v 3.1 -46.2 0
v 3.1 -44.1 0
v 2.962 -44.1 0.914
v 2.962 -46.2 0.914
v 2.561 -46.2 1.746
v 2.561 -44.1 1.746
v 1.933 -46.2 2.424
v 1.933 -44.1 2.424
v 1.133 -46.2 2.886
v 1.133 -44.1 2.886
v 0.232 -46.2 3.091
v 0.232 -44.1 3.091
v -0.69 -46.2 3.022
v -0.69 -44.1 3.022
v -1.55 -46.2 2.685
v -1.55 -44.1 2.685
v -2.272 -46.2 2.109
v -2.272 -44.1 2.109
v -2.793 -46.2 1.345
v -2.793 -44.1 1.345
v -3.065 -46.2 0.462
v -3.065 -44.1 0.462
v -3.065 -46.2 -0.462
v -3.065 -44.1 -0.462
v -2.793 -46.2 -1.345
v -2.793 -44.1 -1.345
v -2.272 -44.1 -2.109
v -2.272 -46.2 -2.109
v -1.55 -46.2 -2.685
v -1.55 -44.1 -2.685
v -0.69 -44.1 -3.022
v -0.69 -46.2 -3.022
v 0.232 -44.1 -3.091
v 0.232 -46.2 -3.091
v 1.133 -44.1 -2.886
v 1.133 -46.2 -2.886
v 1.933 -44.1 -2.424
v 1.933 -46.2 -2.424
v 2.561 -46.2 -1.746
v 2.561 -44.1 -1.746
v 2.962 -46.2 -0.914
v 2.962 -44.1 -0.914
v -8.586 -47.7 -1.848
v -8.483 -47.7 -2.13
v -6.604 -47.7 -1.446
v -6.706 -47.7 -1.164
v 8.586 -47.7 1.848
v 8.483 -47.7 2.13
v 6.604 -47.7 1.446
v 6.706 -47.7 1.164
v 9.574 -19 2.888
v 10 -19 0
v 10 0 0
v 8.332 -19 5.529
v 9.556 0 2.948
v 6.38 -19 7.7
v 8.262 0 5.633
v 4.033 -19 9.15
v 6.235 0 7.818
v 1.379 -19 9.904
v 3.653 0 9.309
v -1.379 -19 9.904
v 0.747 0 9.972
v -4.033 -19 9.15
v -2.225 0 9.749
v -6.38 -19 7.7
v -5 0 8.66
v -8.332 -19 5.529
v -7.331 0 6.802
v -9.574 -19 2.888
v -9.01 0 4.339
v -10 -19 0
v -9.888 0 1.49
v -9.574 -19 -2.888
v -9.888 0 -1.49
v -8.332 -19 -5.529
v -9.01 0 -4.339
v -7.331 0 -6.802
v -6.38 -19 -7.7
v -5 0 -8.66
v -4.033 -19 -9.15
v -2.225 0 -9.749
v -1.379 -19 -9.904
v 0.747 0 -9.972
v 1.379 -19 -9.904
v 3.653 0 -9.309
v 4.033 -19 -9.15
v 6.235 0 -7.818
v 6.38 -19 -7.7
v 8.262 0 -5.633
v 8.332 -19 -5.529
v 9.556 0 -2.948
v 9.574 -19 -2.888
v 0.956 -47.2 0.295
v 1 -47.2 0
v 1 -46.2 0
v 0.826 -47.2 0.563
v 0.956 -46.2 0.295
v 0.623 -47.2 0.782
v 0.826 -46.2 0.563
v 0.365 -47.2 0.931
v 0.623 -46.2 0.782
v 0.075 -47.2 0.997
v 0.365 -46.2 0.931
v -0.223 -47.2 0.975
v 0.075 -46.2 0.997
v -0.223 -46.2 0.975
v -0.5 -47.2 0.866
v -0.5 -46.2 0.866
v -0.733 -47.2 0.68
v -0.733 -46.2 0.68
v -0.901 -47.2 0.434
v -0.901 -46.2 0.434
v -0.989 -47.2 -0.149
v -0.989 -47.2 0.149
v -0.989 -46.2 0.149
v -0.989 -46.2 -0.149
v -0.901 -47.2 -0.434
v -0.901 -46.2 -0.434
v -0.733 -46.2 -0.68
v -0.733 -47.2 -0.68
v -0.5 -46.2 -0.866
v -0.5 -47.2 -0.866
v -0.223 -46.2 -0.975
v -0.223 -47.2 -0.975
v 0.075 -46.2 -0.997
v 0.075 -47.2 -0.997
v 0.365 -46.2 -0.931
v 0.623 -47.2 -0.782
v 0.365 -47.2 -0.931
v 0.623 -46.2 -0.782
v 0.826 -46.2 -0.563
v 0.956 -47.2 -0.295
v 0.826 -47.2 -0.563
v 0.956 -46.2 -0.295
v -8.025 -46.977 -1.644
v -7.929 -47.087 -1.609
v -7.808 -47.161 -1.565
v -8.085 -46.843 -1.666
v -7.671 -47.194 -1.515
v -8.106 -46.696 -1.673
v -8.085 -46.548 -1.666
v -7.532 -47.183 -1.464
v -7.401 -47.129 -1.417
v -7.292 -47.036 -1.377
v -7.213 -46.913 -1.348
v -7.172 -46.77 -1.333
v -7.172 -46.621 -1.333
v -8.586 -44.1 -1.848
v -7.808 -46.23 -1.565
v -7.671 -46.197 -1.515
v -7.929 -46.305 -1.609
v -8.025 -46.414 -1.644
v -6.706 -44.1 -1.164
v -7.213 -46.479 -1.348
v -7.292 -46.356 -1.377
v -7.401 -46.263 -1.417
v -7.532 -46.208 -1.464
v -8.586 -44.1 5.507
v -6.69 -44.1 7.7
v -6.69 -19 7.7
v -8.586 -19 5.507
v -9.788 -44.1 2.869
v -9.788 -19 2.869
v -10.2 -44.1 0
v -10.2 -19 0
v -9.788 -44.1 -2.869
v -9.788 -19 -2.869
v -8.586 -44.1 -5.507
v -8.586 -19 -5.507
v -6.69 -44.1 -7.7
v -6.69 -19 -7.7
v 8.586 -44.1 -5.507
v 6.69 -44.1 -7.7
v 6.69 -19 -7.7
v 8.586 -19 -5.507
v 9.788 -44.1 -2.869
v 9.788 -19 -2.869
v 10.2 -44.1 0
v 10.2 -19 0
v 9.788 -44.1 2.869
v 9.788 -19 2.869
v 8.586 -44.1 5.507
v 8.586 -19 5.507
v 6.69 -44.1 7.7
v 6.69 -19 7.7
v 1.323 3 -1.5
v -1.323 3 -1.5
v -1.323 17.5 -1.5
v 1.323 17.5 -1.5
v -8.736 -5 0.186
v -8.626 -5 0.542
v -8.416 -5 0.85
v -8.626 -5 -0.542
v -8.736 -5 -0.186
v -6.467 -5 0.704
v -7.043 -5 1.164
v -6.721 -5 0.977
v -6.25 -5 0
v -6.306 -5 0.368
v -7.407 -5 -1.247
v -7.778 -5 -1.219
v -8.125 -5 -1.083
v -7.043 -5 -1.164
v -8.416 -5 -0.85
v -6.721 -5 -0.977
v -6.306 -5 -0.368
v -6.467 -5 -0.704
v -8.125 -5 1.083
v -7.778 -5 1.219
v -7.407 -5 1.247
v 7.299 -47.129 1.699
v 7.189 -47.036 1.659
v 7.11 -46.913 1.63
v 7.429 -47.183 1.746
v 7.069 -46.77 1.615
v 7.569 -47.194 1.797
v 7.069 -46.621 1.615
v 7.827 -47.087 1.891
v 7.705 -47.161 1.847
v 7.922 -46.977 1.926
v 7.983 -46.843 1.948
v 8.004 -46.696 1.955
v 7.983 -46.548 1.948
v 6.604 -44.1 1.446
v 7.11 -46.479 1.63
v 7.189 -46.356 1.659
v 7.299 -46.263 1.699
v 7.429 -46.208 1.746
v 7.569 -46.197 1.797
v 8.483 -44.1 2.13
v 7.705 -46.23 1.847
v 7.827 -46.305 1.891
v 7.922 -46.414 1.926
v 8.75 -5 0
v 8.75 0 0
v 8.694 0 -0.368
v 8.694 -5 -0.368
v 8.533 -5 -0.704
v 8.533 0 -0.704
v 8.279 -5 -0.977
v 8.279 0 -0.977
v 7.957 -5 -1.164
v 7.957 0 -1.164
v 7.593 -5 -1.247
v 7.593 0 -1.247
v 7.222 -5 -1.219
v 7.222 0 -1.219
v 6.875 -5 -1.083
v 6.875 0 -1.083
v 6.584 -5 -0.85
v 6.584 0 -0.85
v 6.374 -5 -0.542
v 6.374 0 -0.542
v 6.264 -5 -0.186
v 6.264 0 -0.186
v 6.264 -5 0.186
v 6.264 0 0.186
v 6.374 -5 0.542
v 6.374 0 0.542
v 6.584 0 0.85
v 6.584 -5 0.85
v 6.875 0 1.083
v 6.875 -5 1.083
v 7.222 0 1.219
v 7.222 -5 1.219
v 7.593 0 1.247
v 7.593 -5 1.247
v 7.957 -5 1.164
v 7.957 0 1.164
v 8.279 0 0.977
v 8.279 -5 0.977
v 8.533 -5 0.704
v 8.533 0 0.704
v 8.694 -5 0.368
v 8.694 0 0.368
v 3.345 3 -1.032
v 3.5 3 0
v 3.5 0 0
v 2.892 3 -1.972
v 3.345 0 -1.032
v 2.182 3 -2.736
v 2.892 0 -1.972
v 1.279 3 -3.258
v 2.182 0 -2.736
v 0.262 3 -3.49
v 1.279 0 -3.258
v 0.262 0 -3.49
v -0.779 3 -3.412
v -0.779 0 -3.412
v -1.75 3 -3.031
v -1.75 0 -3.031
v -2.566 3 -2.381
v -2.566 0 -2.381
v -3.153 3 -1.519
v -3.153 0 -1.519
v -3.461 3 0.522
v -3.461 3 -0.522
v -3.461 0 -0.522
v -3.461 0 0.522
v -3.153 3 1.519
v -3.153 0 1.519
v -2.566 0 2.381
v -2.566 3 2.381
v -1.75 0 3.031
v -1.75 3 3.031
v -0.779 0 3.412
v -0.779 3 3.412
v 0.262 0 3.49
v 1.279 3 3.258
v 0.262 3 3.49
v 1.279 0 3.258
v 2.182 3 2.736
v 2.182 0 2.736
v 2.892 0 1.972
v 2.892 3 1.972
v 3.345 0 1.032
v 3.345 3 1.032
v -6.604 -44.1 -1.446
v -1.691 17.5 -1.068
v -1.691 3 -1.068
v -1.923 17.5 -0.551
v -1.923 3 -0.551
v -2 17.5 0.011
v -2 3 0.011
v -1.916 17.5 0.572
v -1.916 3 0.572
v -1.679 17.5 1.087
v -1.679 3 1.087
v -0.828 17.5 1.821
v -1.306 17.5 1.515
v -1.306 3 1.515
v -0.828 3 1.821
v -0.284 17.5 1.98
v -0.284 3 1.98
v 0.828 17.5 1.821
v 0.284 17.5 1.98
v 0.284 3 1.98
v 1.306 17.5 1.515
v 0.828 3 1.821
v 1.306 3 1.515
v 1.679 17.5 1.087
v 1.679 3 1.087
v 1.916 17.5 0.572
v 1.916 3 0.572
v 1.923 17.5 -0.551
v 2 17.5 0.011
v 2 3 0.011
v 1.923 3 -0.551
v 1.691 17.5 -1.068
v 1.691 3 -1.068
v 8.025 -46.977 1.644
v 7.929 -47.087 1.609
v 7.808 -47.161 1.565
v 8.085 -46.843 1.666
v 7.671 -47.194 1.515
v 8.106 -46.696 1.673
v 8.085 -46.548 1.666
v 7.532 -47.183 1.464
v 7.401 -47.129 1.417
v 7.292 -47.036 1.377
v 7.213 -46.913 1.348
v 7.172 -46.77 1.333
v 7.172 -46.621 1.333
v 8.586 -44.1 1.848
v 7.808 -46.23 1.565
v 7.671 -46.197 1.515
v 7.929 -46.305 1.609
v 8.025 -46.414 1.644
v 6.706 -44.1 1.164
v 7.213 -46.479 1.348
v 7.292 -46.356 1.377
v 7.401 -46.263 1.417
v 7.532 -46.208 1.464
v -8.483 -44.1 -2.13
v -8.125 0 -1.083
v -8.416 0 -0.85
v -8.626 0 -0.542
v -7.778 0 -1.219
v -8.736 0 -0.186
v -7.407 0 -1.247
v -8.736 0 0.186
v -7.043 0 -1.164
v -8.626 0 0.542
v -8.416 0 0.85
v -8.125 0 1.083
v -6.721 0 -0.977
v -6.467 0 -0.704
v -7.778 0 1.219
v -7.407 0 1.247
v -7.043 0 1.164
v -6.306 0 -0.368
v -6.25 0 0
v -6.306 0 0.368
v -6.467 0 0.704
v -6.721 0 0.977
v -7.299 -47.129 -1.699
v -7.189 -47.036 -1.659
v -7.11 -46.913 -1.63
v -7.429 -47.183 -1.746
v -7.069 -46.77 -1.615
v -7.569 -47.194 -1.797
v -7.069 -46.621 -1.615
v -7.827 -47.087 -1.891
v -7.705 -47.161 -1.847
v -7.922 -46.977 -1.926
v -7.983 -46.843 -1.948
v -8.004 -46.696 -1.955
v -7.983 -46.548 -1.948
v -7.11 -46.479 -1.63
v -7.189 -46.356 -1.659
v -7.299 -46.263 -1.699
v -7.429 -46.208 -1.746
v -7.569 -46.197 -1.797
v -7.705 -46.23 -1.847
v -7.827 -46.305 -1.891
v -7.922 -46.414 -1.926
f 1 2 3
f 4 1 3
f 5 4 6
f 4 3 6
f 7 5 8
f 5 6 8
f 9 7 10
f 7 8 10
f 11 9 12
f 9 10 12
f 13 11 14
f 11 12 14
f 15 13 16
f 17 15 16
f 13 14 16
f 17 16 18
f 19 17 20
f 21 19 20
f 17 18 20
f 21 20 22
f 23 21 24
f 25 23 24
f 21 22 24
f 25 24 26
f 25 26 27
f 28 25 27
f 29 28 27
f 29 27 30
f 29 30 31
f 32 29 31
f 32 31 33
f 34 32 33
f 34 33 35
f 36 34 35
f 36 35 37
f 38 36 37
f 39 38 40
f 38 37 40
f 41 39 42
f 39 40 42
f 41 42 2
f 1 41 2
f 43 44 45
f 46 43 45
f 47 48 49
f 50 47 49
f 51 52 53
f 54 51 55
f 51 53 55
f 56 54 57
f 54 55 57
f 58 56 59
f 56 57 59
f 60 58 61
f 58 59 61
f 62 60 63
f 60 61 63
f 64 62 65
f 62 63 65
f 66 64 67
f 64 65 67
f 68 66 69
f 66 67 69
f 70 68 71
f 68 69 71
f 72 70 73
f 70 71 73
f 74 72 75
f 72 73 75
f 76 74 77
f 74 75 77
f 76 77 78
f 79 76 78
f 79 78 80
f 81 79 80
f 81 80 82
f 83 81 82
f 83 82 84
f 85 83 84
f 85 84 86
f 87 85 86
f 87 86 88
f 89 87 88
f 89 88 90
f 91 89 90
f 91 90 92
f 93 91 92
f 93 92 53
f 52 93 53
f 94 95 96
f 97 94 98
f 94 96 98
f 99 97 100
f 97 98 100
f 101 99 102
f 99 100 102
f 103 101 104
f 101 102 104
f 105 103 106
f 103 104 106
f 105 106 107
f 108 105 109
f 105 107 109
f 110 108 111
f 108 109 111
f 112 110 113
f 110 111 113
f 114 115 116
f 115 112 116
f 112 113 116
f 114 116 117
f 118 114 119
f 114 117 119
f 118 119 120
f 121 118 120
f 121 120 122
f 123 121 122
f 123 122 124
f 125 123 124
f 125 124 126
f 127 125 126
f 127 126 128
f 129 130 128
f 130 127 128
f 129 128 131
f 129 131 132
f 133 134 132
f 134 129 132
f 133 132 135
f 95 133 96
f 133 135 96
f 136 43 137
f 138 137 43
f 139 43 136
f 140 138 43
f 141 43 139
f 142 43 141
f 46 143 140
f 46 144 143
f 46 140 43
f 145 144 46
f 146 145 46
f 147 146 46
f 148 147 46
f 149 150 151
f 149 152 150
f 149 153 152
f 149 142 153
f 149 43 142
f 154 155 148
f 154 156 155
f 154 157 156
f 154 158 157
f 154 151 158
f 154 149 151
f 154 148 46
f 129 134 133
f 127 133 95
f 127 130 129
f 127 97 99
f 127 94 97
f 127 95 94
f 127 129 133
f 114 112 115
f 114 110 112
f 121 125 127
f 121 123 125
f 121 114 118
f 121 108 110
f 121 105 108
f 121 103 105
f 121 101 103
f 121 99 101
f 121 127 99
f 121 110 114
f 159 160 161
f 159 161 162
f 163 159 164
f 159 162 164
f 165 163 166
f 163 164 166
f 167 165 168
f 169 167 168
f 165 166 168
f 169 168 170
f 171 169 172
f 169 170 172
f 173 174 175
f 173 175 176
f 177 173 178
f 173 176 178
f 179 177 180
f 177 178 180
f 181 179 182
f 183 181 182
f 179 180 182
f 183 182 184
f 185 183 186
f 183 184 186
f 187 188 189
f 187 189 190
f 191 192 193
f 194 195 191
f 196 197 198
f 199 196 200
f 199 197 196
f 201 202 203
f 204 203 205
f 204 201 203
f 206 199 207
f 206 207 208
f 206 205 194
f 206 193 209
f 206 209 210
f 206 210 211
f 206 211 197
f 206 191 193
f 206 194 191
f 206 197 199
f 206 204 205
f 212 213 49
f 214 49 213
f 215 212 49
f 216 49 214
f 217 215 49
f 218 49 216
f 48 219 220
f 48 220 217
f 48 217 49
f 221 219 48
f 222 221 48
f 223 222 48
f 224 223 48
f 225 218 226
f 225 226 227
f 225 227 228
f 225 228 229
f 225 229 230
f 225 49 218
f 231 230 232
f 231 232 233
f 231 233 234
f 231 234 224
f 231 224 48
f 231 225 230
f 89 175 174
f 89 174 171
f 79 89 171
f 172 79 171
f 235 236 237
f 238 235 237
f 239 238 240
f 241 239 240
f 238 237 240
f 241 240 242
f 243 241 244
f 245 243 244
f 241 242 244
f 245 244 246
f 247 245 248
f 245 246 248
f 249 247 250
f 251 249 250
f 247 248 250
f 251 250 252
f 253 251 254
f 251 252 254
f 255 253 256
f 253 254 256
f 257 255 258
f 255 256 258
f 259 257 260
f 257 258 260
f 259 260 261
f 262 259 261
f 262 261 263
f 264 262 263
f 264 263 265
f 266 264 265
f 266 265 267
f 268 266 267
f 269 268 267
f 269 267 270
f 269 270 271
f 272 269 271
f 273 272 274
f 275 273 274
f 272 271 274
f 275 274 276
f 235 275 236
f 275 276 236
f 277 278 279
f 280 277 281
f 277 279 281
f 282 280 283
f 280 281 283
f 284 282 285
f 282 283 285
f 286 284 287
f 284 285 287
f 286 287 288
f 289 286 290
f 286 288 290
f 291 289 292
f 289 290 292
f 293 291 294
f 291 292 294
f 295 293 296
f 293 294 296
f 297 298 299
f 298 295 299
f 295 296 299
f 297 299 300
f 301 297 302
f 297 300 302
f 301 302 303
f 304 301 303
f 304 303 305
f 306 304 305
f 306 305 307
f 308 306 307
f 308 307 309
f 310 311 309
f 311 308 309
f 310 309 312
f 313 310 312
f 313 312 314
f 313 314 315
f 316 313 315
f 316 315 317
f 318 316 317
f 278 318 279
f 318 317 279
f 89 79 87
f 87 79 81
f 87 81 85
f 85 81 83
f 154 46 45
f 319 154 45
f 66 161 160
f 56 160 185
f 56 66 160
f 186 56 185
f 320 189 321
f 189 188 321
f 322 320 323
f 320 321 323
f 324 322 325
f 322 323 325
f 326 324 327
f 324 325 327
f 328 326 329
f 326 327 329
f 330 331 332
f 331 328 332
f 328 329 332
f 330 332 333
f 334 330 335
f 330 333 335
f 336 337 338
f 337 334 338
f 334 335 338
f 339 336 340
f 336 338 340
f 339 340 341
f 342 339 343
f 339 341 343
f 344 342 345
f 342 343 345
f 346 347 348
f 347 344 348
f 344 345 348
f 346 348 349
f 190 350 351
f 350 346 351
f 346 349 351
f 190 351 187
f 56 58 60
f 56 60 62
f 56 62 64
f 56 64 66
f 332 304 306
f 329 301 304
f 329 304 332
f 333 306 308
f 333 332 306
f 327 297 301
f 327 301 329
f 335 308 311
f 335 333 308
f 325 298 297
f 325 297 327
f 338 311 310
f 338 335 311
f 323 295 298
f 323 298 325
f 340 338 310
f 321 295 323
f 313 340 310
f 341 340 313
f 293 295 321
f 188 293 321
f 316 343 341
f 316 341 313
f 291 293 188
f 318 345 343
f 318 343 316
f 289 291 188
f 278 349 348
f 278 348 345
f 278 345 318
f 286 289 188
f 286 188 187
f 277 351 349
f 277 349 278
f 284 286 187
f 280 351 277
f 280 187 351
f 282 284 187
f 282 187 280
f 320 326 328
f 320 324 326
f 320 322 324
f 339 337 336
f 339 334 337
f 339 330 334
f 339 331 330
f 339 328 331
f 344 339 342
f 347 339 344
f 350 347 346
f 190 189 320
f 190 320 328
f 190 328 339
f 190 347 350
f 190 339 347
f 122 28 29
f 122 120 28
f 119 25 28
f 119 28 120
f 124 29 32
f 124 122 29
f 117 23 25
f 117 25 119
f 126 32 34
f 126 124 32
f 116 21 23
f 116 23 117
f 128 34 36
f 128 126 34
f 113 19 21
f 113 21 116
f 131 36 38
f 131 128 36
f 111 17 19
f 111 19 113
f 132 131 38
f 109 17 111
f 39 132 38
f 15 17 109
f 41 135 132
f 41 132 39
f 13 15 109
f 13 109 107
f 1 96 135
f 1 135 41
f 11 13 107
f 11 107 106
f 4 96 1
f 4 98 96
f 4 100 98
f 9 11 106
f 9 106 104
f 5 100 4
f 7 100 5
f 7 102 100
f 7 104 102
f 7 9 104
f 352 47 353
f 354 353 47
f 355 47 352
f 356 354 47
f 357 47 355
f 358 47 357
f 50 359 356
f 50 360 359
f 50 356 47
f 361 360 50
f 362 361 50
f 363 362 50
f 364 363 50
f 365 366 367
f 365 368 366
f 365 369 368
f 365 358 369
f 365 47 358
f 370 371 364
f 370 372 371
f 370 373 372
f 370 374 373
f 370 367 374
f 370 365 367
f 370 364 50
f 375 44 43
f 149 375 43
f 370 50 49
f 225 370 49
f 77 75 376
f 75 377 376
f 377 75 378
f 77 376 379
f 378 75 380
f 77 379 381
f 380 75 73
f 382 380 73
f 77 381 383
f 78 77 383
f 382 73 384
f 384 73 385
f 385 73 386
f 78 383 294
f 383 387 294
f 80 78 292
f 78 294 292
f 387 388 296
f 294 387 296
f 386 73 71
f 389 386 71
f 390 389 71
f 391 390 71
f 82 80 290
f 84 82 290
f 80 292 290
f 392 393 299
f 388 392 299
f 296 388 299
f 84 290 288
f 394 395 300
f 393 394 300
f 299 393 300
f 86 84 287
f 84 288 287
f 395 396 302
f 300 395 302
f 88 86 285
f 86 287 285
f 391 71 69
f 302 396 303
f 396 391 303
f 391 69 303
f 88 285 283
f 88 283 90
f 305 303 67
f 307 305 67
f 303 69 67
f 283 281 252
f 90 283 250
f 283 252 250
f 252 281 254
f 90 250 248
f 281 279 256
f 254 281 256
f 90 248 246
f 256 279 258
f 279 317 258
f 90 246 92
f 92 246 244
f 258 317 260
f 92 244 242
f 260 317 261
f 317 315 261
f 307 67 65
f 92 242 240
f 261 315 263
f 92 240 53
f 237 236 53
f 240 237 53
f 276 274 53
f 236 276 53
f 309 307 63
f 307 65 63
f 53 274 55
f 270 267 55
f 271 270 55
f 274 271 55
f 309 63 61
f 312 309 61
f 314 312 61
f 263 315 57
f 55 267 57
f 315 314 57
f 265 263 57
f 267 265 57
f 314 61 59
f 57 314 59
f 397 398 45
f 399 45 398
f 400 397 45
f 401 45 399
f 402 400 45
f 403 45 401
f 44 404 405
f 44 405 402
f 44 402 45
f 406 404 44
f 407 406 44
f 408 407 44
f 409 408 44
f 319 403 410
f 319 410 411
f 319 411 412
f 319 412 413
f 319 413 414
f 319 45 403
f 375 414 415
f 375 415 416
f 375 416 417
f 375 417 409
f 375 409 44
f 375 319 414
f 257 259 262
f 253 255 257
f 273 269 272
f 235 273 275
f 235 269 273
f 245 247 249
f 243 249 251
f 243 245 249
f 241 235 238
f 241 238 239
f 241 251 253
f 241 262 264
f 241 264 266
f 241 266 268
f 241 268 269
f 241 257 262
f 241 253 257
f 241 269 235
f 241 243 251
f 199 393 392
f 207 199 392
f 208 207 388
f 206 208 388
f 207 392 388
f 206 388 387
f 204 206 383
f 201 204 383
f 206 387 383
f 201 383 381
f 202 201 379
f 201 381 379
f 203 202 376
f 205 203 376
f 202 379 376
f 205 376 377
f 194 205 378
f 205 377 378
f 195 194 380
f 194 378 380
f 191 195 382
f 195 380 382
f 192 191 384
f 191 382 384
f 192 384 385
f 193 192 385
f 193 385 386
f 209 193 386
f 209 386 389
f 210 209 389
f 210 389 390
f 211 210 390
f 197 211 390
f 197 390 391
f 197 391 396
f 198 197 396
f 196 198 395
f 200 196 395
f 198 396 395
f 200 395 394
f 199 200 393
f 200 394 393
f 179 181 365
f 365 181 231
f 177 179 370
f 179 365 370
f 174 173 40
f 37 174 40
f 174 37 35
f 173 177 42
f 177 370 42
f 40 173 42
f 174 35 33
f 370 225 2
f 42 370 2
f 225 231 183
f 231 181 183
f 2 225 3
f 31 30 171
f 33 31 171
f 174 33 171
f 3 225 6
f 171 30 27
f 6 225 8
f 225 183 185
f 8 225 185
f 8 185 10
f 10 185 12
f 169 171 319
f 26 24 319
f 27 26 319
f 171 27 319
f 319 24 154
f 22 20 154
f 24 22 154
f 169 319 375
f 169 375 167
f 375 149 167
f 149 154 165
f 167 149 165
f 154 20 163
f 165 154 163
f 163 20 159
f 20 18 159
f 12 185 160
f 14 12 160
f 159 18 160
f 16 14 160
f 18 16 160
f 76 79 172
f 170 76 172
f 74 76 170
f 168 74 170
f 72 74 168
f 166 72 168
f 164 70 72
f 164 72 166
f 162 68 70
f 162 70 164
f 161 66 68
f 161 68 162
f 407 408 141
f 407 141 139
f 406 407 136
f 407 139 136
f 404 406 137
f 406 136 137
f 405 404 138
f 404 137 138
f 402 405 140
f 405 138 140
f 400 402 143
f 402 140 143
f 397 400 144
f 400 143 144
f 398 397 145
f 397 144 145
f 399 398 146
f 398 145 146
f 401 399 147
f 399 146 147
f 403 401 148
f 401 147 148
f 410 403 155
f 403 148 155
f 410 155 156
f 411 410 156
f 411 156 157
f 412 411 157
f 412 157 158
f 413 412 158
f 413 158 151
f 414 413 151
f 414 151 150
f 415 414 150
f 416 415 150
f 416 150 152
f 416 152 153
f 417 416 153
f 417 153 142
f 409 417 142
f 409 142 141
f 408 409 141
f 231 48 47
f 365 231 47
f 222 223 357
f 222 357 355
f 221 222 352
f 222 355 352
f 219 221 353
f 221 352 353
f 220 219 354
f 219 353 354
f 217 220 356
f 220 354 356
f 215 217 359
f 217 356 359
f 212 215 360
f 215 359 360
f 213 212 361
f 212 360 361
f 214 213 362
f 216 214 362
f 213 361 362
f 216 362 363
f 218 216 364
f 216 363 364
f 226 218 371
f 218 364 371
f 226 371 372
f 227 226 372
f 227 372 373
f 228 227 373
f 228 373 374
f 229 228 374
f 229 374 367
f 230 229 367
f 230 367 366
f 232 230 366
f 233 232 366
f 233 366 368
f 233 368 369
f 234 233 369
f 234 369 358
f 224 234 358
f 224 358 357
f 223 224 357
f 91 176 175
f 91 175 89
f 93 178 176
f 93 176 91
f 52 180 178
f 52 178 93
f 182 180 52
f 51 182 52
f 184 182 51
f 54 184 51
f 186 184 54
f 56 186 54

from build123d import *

# Parameters (mm, degrees)
SKETCH_R                 = 10
PAD_DEPTH                = 19
SKETCH001_R              = 3.5
PAD001_DEPTH             = 3
SKETCH002_R              = 2
PAD002_DEPTH             = 14.5
SKETCH003_W              = 10
SKETCH003_H              = 5
POCKET_DEPTH             = 14.5
PAD003_DEPTH             = 25.1
SKETCH005_R              = 3.1
PAD004_DEPTH             = 2.1
SKETCH006_R              = 1
PAD005_DEPTH             = 6
PAD006_DEPTH             = 3.6
SKETCH009_R              = 0.5
POCKET001_DEPTH          = 5
POLARPATTERN_COUNT       = 2
POLARPATTERN001_COUNT    = 2
POLARPATTERN001_FACE35_R = 1
POCKET002_DEPTH          = 5
SKETCH010_R              = 1.25
POCKET003_DEPTH          = 5


with BuildPart() as part:
    # Sketch → Pad (new body)
    with BuildSketch(Plane.XZ):
        Circle(SKETCH_R)
    extrude(amount=PAD_DEPTH)

    # Sketch001 (on Face2 of Pad) → Pad001 (join)
    with BuildSketch(Plane(origin=(0, 0, 0), x_dir=(1, 0, 0), z_dir=(0, 1, 0))):
        Circle(SKETCH001_R)
    extrude(amount=PAD001_DEPTH)

    # Sketch002 (on Face5 of Pad001) → Pad002 (join)
    with BuildSketch(Plane(origin=(0, 3, 0), x_dir=(1, 0, 0), z_dir=(0, 1, 0))):
        Circle(SKETCH002_R)
    extrude(amount=PAD002_DEPTH)

    # Sketch003 (on Face7 of Pad002) → Pocket (cut)
    with BuildSketch(Plane(origin=(0, 17.5, 0), x_dir=(1, 0, 0), z_dir=(0, 1, 0))):
        with Locations((0, 4)):
            Rectangle(SKETCH003_W, SKETCH003_H)
    extrude(amount=-POCKET_DEPTH, mode=Mode.SUBTRACT)

    # Sketch004 (on Face3 of Pocket) → Pad003 (join)
    with BuildSketch(Plane.XZ.offset(19)):
        with BuildLine():
            Line((-6.689544, 7.7), (6.689544, 7.7))
            ThreePointArc((6.689544, -7.7), (10.2, 0), (6.689544, 7.7))
            Line((6.689544, -7.7), (-6.689544, -7.7))
            ThreePointArc((-6.689544, 7.7), (-10.2, 0), (-6.689544, -7.7))
        make_face()
    extrude(amount=PAD003_DEPTH)

    # Sketch005 (on Face14 of Pad003) → Pad004 (join)
    with BuildSketch(Plane.XZ.offset(44.1)):
        Circle(SKETCH005_R)
    extrude(amount=PAD004_DEPTH)

    # Sketch006 (on Face21 of Pad004) → Pad005 (join)
    with BuildSketch(Plane.XZ.offset(46.2)):
        Circle(SKETCH006_R)
    extrude(amount=PAD005_DEPTH)

    # Sketch008 (on Face14 of Pad005) → Pad006 (join)
    with BuildSketch(Plane.XZ.offset(44.1)):
        Polygon((6.603759, 1.445812), (8.483144, 2.129852), (8.58575, 1.847944), (6.706365, 1.163904), align=None)
    pad006 = extrude(amount=PAD006_DEPTH)

    # Sketch009 (on Face21 of Pad006) → Pocket001 (cut)
    with BuildSketch(Plane(origin=(0.410424, 0, -1.127631), x_dir=(0.939693, 0, 0.34202), z_dir=(0.34202, 0, -0.939693))):
        with Locations((7.689708, 46.695641)):
            Circle(SKETCH009_R)
    pocket001 = extrude(amount=-POCKET001_DEPTH, mode=Mode.SUBTRACT)

    # PolarPattern: Pad006 ×2 about axis
    polarpattern_axis = Axis((0, -44.1, 0), (0, -1, 0))
    for i in range(1, POLARPATTERN_COUNT):
        add(pad006.rotate(polarpattern_axis, i * 360 / POLARPATTERN_COUNT))

    # PolarPattern001: Pocket001 ×2 about axis
    polarpattern001_axis = Axis((0, 0, 0), (0, 1, 0))
    for i in range(1, POLARPATTERN001_COUNT):
        add(pocket001.rotate(polarpattern001_axis, i * 360 / POLARPATTERN001_COUNT), mode=Mode.SUBTRACT)

    # PolarPattern001 Face35 → Pocket002 (cut)
    with BuildSketch(Plane(origin=(0, -52.2, 0), x_dir=(-1, 0, 0), z_dir=(0, -1, 0))):
        Circle(POLARPATTERN001_FACE35_R)
    extrude(amount=-POCKET002_DEPTH, mode=Mode.SUBTRACT)

    # Sketch010 (on Face2 of Pocket002) → Pocket003 (cut)
    with BuildSketch(Plane(origin=(0, 0, 0), x_dir=(1, 0, 0), z_dir=(0, 1, 0))):
        with Locations((-7.5, 0)):
            Circle(SKETCH010_R)
        with Locations((7.5, 0)):
            Circle(SKETCH010_R)
    extrude(amount=-POCKET003_DEPTH, mode=Mode.SUBTRACT)


solid = part.part
